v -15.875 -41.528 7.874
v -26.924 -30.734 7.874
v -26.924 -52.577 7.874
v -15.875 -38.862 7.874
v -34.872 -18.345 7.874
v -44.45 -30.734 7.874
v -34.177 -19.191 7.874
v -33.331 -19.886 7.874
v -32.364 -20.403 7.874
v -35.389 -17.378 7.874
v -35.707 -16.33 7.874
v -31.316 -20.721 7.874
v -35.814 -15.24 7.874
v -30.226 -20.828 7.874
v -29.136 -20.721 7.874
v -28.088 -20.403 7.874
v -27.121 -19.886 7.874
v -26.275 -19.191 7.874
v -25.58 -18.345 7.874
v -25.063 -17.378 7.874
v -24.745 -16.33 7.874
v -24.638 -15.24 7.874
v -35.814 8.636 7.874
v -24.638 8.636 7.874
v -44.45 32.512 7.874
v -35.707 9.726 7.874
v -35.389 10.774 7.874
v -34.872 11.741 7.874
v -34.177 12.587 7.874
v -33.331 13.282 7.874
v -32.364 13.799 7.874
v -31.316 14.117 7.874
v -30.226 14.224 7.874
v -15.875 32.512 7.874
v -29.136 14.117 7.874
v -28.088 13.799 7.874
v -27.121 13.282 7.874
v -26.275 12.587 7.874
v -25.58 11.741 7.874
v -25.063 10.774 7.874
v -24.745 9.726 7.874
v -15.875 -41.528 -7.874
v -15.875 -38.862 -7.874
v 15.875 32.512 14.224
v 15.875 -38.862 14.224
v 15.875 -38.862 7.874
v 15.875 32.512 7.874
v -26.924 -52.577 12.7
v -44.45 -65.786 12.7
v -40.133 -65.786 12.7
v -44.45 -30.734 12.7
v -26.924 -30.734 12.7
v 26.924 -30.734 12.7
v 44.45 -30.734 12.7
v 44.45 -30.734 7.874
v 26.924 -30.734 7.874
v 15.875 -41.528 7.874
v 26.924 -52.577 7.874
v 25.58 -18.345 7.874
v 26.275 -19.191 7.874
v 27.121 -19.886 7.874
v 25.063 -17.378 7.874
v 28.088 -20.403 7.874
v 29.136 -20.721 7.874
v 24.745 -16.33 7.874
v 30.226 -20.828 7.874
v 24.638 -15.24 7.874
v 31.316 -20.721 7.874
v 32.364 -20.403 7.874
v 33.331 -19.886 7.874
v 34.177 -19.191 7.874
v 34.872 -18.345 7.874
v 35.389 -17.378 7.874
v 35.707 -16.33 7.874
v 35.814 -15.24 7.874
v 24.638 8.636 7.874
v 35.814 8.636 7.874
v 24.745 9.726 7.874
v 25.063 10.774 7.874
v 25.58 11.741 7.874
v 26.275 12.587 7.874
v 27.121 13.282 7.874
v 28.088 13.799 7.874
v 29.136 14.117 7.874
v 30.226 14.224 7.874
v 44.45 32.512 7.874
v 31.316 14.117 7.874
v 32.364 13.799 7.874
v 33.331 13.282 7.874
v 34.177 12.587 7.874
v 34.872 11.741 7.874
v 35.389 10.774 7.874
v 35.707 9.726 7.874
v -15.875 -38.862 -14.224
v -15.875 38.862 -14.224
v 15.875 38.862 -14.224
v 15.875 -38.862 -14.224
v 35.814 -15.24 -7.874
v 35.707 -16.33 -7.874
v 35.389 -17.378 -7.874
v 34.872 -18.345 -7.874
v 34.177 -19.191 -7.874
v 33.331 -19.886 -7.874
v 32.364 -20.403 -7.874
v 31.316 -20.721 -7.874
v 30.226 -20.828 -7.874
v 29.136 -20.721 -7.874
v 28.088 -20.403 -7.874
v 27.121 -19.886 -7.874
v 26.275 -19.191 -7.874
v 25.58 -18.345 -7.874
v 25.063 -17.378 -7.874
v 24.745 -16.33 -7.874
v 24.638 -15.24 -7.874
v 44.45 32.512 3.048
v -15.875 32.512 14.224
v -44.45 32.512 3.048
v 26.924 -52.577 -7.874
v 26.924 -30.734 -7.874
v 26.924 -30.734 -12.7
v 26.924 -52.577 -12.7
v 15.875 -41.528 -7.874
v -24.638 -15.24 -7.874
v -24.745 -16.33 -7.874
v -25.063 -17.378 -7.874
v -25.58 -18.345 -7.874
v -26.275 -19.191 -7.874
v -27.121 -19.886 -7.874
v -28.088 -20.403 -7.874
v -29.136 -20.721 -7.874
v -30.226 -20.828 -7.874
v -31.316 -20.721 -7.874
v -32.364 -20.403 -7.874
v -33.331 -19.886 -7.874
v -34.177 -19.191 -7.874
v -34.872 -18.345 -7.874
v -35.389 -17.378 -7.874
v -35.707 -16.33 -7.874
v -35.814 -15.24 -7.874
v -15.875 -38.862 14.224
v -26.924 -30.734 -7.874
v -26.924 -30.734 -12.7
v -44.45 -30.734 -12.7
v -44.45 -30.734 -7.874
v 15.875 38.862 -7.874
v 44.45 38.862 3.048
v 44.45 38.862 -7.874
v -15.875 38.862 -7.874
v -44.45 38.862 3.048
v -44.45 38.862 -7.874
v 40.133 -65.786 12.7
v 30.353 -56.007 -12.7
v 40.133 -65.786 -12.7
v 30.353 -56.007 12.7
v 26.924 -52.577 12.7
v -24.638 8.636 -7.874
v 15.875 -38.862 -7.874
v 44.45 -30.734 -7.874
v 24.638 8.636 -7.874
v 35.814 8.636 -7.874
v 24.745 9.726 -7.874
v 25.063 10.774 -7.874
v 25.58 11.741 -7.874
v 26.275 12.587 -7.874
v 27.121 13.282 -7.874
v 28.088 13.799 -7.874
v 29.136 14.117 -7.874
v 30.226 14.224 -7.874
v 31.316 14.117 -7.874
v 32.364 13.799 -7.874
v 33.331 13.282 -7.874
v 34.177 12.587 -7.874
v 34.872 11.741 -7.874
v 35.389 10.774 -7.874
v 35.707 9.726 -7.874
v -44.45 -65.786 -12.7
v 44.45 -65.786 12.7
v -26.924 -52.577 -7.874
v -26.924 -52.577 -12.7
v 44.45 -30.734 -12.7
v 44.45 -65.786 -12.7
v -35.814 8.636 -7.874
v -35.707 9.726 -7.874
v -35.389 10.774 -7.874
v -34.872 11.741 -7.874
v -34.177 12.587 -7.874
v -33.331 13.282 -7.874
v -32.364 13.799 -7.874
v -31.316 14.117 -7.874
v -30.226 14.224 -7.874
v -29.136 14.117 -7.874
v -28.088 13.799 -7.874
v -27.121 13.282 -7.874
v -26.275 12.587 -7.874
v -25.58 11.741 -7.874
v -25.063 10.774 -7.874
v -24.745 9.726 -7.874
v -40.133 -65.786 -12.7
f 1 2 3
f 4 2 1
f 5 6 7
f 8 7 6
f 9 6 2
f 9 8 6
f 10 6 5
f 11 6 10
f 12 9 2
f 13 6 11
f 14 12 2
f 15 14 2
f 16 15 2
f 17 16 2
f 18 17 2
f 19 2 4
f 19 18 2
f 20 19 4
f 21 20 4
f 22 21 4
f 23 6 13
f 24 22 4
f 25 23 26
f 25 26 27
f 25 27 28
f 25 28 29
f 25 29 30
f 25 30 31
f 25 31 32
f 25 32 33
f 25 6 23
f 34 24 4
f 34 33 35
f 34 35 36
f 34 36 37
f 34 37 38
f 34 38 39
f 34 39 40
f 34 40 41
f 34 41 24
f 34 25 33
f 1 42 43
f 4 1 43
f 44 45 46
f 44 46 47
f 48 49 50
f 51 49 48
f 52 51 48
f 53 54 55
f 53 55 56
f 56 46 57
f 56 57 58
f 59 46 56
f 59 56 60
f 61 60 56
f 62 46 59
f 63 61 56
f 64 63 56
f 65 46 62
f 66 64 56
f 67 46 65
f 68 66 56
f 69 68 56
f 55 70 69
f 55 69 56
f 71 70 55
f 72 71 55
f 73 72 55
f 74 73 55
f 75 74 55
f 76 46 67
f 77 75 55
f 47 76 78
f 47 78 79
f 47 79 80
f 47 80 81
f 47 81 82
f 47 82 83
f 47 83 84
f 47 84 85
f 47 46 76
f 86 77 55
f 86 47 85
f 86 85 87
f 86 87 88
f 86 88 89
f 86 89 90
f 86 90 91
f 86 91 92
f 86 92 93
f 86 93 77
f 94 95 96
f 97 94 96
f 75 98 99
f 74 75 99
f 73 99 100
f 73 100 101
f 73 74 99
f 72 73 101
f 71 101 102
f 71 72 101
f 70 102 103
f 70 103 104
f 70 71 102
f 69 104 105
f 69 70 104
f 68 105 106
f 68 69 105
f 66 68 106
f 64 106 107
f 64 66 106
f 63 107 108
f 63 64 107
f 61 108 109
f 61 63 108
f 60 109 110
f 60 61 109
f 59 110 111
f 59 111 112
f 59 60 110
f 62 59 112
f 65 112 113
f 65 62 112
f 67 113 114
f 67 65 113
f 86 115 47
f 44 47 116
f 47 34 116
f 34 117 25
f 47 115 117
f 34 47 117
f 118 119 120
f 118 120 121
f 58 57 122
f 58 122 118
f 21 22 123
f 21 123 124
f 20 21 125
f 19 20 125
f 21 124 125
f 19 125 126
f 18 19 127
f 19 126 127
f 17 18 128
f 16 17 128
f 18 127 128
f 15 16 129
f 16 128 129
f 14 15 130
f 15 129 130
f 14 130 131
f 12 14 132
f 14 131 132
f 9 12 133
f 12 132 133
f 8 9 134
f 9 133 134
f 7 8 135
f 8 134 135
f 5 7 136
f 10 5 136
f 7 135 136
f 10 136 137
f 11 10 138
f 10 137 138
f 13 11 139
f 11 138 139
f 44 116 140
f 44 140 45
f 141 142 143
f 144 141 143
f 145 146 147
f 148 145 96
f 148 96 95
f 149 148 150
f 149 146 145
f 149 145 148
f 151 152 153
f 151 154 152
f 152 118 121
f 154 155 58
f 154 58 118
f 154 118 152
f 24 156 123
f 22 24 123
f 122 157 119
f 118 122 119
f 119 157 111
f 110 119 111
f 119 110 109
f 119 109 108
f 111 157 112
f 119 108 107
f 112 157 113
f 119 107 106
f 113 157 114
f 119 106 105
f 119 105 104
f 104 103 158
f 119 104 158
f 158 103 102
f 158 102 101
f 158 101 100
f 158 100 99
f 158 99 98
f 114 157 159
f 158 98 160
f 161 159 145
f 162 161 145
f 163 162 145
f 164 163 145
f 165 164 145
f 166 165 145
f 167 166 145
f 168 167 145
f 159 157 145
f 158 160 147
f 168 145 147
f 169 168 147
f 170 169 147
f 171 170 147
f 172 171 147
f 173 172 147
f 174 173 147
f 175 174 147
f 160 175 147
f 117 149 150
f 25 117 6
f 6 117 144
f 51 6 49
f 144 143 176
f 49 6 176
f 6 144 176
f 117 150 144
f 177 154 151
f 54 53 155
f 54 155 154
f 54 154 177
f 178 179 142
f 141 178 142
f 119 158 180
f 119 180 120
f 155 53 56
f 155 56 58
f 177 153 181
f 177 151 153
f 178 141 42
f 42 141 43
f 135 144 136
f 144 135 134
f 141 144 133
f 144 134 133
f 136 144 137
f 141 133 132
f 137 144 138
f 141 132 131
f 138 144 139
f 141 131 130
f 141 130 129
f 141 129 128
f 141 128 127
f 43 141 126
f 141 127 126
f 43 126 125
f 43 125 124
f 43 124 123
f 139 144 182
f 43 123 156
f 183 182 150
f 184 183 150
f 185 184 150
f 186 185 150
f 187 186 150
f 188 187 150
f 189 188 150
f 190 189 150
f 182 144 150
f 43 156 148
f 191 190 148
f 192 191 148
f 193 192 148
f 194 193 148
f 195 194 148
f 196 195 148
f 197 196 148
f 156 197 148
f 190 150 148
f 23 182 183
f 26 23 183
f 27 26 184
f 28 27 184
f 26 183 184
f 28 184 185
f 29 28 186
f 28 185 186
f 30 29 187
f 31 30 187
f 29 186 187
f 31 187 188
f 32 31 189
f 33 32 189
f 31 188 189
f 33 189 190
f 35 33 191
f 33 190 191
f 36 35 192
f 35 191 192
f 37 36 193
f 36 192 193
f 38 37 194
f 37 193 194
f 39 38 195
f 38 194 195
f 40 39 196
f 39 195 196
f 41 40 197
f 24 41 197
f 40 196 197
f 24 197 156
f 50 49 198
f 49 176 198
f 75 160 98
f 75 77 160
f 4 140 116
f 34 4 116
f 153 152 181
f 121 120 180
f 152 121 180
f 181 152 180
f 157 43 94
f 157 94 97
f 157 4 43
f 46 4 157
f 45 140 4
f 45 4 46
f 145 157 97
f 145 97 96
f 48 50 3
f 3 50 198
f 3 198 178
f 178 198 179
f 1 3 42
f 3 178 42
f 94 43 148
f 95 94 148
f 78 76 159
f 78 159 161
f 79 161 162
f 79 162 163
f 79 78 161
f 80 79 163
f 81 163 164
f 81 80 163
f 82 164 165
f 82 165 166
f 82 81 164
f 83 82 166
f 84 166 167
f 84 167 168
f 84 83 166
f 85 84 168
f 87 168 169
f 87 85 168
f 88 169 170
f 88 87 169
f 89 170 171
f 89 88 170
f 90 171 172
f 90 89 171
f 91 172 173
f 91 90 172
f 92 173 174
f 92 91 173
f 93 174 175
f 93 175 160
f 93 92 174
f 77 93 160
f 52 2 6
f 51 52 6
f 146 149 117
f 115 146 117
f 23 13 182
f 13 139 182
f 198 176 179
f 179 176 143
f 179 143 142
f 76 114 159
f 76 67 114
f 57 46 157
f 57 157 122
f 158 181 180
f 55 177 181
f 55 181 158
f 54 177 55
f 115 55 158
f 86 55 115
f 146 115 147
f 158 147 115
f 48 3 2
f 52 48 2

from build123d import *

# Parameters (mm, degrees)
F0_W     = 31.75
F0_H     = 77.724
F1_DEPTH = 14.224
F2_DEPTH = 7.874
F4_DEPTH = 88.901
F5_DEPTH = 12.7


with BuildPart() as f1:
    # F0 (on Top) → F1 (new body, symmetric)
    with BuildSketch(Plane.XY):
        Rectangle(F0_W, F0_H)
    extrude(amount=F1_DEPTH, both=True)

    # F0 (on Top) → F2 (join, symmetric)
    with BuildSketch(Plane.XY):
        Polygon((-15.875, -38.862), (-15.875, 38.862), (-44.45, 38.862), (-44.45, -30.734), (-26.924, -30.734), (-26.924, -52.577469), (-15.875, -41.528469), align=None)
        with BuildLine():
            Line((-35.814, -15.24), (-35.814, 8.636))
            ThreePointArc((-35.814, 8.636), (-30.226, 14.224), (-24.638, 8.636))
            Line((-24.638, 8.636), (-24.638, -15.24))
            ThreePointArc((-24.638, -15.24), (-30.226, -20.828), (-35.814, -15.24))
        make_face(mode=Mode.SUBTRACT)
        Polygon((44.45, 38.862), (15.875, 38.862), (15.875, -38.862), (15.875, -41.528469), (26.924, -52.577469), (26.924, -30.734), (44.45, -30.734), align=None)
        with BuildLine():
            ThreePointArc((24.638, 8.636), (30.226, 14.224), (35.814, 8.636))
            Line((35.814, 8.636), (35.814, -15.24))
            ThreePointArc((35.814, -15.24), (30.226, -20.828), (24.638, -15.24))
            Line((24.638, -15.24), (24.638, 8.636))
        make_face(mode=Mode.SUBTRACT)
    extrude(amount=F2_DEPTH, both=True)

    # F3 (on face) → F4 (cut, through all)
    with BuildSketch(Plane(origin=(-44.45, 0, 0), x_dir=(0, -1, 0), z_dir=(-1, 0, 0))):
        Polygon((-38.862, 7.874), (-38.862, 3.048), (-32.512, 3.048), (-32.512, 17.1704), (-38.862, 17.1704), align=None)
    extrude(amount=-F4_DEPTH, mode=Mode.SUBTRACT)

    # F0 (on Top) → F5 (join, symmetric)
    with BuildSketch(Plane.XY):
        Polygon((-26.924, -30.734), (-44.45, -30.734), (-44.45, -65.786), (-40.132531, -65.786), (-30.353265, -56.006734), (-26.924, -52.577469), align=None)
        Polygon((44.45, -65.786), (44.45, -30.734), (26.924, -30.734), (26.924, -52.577469), (30.353265, -56.006733), (40.132531, -65.786), align=None)
    extrude(amount=F5_DEPTH, both=True)


solid = f1.part
